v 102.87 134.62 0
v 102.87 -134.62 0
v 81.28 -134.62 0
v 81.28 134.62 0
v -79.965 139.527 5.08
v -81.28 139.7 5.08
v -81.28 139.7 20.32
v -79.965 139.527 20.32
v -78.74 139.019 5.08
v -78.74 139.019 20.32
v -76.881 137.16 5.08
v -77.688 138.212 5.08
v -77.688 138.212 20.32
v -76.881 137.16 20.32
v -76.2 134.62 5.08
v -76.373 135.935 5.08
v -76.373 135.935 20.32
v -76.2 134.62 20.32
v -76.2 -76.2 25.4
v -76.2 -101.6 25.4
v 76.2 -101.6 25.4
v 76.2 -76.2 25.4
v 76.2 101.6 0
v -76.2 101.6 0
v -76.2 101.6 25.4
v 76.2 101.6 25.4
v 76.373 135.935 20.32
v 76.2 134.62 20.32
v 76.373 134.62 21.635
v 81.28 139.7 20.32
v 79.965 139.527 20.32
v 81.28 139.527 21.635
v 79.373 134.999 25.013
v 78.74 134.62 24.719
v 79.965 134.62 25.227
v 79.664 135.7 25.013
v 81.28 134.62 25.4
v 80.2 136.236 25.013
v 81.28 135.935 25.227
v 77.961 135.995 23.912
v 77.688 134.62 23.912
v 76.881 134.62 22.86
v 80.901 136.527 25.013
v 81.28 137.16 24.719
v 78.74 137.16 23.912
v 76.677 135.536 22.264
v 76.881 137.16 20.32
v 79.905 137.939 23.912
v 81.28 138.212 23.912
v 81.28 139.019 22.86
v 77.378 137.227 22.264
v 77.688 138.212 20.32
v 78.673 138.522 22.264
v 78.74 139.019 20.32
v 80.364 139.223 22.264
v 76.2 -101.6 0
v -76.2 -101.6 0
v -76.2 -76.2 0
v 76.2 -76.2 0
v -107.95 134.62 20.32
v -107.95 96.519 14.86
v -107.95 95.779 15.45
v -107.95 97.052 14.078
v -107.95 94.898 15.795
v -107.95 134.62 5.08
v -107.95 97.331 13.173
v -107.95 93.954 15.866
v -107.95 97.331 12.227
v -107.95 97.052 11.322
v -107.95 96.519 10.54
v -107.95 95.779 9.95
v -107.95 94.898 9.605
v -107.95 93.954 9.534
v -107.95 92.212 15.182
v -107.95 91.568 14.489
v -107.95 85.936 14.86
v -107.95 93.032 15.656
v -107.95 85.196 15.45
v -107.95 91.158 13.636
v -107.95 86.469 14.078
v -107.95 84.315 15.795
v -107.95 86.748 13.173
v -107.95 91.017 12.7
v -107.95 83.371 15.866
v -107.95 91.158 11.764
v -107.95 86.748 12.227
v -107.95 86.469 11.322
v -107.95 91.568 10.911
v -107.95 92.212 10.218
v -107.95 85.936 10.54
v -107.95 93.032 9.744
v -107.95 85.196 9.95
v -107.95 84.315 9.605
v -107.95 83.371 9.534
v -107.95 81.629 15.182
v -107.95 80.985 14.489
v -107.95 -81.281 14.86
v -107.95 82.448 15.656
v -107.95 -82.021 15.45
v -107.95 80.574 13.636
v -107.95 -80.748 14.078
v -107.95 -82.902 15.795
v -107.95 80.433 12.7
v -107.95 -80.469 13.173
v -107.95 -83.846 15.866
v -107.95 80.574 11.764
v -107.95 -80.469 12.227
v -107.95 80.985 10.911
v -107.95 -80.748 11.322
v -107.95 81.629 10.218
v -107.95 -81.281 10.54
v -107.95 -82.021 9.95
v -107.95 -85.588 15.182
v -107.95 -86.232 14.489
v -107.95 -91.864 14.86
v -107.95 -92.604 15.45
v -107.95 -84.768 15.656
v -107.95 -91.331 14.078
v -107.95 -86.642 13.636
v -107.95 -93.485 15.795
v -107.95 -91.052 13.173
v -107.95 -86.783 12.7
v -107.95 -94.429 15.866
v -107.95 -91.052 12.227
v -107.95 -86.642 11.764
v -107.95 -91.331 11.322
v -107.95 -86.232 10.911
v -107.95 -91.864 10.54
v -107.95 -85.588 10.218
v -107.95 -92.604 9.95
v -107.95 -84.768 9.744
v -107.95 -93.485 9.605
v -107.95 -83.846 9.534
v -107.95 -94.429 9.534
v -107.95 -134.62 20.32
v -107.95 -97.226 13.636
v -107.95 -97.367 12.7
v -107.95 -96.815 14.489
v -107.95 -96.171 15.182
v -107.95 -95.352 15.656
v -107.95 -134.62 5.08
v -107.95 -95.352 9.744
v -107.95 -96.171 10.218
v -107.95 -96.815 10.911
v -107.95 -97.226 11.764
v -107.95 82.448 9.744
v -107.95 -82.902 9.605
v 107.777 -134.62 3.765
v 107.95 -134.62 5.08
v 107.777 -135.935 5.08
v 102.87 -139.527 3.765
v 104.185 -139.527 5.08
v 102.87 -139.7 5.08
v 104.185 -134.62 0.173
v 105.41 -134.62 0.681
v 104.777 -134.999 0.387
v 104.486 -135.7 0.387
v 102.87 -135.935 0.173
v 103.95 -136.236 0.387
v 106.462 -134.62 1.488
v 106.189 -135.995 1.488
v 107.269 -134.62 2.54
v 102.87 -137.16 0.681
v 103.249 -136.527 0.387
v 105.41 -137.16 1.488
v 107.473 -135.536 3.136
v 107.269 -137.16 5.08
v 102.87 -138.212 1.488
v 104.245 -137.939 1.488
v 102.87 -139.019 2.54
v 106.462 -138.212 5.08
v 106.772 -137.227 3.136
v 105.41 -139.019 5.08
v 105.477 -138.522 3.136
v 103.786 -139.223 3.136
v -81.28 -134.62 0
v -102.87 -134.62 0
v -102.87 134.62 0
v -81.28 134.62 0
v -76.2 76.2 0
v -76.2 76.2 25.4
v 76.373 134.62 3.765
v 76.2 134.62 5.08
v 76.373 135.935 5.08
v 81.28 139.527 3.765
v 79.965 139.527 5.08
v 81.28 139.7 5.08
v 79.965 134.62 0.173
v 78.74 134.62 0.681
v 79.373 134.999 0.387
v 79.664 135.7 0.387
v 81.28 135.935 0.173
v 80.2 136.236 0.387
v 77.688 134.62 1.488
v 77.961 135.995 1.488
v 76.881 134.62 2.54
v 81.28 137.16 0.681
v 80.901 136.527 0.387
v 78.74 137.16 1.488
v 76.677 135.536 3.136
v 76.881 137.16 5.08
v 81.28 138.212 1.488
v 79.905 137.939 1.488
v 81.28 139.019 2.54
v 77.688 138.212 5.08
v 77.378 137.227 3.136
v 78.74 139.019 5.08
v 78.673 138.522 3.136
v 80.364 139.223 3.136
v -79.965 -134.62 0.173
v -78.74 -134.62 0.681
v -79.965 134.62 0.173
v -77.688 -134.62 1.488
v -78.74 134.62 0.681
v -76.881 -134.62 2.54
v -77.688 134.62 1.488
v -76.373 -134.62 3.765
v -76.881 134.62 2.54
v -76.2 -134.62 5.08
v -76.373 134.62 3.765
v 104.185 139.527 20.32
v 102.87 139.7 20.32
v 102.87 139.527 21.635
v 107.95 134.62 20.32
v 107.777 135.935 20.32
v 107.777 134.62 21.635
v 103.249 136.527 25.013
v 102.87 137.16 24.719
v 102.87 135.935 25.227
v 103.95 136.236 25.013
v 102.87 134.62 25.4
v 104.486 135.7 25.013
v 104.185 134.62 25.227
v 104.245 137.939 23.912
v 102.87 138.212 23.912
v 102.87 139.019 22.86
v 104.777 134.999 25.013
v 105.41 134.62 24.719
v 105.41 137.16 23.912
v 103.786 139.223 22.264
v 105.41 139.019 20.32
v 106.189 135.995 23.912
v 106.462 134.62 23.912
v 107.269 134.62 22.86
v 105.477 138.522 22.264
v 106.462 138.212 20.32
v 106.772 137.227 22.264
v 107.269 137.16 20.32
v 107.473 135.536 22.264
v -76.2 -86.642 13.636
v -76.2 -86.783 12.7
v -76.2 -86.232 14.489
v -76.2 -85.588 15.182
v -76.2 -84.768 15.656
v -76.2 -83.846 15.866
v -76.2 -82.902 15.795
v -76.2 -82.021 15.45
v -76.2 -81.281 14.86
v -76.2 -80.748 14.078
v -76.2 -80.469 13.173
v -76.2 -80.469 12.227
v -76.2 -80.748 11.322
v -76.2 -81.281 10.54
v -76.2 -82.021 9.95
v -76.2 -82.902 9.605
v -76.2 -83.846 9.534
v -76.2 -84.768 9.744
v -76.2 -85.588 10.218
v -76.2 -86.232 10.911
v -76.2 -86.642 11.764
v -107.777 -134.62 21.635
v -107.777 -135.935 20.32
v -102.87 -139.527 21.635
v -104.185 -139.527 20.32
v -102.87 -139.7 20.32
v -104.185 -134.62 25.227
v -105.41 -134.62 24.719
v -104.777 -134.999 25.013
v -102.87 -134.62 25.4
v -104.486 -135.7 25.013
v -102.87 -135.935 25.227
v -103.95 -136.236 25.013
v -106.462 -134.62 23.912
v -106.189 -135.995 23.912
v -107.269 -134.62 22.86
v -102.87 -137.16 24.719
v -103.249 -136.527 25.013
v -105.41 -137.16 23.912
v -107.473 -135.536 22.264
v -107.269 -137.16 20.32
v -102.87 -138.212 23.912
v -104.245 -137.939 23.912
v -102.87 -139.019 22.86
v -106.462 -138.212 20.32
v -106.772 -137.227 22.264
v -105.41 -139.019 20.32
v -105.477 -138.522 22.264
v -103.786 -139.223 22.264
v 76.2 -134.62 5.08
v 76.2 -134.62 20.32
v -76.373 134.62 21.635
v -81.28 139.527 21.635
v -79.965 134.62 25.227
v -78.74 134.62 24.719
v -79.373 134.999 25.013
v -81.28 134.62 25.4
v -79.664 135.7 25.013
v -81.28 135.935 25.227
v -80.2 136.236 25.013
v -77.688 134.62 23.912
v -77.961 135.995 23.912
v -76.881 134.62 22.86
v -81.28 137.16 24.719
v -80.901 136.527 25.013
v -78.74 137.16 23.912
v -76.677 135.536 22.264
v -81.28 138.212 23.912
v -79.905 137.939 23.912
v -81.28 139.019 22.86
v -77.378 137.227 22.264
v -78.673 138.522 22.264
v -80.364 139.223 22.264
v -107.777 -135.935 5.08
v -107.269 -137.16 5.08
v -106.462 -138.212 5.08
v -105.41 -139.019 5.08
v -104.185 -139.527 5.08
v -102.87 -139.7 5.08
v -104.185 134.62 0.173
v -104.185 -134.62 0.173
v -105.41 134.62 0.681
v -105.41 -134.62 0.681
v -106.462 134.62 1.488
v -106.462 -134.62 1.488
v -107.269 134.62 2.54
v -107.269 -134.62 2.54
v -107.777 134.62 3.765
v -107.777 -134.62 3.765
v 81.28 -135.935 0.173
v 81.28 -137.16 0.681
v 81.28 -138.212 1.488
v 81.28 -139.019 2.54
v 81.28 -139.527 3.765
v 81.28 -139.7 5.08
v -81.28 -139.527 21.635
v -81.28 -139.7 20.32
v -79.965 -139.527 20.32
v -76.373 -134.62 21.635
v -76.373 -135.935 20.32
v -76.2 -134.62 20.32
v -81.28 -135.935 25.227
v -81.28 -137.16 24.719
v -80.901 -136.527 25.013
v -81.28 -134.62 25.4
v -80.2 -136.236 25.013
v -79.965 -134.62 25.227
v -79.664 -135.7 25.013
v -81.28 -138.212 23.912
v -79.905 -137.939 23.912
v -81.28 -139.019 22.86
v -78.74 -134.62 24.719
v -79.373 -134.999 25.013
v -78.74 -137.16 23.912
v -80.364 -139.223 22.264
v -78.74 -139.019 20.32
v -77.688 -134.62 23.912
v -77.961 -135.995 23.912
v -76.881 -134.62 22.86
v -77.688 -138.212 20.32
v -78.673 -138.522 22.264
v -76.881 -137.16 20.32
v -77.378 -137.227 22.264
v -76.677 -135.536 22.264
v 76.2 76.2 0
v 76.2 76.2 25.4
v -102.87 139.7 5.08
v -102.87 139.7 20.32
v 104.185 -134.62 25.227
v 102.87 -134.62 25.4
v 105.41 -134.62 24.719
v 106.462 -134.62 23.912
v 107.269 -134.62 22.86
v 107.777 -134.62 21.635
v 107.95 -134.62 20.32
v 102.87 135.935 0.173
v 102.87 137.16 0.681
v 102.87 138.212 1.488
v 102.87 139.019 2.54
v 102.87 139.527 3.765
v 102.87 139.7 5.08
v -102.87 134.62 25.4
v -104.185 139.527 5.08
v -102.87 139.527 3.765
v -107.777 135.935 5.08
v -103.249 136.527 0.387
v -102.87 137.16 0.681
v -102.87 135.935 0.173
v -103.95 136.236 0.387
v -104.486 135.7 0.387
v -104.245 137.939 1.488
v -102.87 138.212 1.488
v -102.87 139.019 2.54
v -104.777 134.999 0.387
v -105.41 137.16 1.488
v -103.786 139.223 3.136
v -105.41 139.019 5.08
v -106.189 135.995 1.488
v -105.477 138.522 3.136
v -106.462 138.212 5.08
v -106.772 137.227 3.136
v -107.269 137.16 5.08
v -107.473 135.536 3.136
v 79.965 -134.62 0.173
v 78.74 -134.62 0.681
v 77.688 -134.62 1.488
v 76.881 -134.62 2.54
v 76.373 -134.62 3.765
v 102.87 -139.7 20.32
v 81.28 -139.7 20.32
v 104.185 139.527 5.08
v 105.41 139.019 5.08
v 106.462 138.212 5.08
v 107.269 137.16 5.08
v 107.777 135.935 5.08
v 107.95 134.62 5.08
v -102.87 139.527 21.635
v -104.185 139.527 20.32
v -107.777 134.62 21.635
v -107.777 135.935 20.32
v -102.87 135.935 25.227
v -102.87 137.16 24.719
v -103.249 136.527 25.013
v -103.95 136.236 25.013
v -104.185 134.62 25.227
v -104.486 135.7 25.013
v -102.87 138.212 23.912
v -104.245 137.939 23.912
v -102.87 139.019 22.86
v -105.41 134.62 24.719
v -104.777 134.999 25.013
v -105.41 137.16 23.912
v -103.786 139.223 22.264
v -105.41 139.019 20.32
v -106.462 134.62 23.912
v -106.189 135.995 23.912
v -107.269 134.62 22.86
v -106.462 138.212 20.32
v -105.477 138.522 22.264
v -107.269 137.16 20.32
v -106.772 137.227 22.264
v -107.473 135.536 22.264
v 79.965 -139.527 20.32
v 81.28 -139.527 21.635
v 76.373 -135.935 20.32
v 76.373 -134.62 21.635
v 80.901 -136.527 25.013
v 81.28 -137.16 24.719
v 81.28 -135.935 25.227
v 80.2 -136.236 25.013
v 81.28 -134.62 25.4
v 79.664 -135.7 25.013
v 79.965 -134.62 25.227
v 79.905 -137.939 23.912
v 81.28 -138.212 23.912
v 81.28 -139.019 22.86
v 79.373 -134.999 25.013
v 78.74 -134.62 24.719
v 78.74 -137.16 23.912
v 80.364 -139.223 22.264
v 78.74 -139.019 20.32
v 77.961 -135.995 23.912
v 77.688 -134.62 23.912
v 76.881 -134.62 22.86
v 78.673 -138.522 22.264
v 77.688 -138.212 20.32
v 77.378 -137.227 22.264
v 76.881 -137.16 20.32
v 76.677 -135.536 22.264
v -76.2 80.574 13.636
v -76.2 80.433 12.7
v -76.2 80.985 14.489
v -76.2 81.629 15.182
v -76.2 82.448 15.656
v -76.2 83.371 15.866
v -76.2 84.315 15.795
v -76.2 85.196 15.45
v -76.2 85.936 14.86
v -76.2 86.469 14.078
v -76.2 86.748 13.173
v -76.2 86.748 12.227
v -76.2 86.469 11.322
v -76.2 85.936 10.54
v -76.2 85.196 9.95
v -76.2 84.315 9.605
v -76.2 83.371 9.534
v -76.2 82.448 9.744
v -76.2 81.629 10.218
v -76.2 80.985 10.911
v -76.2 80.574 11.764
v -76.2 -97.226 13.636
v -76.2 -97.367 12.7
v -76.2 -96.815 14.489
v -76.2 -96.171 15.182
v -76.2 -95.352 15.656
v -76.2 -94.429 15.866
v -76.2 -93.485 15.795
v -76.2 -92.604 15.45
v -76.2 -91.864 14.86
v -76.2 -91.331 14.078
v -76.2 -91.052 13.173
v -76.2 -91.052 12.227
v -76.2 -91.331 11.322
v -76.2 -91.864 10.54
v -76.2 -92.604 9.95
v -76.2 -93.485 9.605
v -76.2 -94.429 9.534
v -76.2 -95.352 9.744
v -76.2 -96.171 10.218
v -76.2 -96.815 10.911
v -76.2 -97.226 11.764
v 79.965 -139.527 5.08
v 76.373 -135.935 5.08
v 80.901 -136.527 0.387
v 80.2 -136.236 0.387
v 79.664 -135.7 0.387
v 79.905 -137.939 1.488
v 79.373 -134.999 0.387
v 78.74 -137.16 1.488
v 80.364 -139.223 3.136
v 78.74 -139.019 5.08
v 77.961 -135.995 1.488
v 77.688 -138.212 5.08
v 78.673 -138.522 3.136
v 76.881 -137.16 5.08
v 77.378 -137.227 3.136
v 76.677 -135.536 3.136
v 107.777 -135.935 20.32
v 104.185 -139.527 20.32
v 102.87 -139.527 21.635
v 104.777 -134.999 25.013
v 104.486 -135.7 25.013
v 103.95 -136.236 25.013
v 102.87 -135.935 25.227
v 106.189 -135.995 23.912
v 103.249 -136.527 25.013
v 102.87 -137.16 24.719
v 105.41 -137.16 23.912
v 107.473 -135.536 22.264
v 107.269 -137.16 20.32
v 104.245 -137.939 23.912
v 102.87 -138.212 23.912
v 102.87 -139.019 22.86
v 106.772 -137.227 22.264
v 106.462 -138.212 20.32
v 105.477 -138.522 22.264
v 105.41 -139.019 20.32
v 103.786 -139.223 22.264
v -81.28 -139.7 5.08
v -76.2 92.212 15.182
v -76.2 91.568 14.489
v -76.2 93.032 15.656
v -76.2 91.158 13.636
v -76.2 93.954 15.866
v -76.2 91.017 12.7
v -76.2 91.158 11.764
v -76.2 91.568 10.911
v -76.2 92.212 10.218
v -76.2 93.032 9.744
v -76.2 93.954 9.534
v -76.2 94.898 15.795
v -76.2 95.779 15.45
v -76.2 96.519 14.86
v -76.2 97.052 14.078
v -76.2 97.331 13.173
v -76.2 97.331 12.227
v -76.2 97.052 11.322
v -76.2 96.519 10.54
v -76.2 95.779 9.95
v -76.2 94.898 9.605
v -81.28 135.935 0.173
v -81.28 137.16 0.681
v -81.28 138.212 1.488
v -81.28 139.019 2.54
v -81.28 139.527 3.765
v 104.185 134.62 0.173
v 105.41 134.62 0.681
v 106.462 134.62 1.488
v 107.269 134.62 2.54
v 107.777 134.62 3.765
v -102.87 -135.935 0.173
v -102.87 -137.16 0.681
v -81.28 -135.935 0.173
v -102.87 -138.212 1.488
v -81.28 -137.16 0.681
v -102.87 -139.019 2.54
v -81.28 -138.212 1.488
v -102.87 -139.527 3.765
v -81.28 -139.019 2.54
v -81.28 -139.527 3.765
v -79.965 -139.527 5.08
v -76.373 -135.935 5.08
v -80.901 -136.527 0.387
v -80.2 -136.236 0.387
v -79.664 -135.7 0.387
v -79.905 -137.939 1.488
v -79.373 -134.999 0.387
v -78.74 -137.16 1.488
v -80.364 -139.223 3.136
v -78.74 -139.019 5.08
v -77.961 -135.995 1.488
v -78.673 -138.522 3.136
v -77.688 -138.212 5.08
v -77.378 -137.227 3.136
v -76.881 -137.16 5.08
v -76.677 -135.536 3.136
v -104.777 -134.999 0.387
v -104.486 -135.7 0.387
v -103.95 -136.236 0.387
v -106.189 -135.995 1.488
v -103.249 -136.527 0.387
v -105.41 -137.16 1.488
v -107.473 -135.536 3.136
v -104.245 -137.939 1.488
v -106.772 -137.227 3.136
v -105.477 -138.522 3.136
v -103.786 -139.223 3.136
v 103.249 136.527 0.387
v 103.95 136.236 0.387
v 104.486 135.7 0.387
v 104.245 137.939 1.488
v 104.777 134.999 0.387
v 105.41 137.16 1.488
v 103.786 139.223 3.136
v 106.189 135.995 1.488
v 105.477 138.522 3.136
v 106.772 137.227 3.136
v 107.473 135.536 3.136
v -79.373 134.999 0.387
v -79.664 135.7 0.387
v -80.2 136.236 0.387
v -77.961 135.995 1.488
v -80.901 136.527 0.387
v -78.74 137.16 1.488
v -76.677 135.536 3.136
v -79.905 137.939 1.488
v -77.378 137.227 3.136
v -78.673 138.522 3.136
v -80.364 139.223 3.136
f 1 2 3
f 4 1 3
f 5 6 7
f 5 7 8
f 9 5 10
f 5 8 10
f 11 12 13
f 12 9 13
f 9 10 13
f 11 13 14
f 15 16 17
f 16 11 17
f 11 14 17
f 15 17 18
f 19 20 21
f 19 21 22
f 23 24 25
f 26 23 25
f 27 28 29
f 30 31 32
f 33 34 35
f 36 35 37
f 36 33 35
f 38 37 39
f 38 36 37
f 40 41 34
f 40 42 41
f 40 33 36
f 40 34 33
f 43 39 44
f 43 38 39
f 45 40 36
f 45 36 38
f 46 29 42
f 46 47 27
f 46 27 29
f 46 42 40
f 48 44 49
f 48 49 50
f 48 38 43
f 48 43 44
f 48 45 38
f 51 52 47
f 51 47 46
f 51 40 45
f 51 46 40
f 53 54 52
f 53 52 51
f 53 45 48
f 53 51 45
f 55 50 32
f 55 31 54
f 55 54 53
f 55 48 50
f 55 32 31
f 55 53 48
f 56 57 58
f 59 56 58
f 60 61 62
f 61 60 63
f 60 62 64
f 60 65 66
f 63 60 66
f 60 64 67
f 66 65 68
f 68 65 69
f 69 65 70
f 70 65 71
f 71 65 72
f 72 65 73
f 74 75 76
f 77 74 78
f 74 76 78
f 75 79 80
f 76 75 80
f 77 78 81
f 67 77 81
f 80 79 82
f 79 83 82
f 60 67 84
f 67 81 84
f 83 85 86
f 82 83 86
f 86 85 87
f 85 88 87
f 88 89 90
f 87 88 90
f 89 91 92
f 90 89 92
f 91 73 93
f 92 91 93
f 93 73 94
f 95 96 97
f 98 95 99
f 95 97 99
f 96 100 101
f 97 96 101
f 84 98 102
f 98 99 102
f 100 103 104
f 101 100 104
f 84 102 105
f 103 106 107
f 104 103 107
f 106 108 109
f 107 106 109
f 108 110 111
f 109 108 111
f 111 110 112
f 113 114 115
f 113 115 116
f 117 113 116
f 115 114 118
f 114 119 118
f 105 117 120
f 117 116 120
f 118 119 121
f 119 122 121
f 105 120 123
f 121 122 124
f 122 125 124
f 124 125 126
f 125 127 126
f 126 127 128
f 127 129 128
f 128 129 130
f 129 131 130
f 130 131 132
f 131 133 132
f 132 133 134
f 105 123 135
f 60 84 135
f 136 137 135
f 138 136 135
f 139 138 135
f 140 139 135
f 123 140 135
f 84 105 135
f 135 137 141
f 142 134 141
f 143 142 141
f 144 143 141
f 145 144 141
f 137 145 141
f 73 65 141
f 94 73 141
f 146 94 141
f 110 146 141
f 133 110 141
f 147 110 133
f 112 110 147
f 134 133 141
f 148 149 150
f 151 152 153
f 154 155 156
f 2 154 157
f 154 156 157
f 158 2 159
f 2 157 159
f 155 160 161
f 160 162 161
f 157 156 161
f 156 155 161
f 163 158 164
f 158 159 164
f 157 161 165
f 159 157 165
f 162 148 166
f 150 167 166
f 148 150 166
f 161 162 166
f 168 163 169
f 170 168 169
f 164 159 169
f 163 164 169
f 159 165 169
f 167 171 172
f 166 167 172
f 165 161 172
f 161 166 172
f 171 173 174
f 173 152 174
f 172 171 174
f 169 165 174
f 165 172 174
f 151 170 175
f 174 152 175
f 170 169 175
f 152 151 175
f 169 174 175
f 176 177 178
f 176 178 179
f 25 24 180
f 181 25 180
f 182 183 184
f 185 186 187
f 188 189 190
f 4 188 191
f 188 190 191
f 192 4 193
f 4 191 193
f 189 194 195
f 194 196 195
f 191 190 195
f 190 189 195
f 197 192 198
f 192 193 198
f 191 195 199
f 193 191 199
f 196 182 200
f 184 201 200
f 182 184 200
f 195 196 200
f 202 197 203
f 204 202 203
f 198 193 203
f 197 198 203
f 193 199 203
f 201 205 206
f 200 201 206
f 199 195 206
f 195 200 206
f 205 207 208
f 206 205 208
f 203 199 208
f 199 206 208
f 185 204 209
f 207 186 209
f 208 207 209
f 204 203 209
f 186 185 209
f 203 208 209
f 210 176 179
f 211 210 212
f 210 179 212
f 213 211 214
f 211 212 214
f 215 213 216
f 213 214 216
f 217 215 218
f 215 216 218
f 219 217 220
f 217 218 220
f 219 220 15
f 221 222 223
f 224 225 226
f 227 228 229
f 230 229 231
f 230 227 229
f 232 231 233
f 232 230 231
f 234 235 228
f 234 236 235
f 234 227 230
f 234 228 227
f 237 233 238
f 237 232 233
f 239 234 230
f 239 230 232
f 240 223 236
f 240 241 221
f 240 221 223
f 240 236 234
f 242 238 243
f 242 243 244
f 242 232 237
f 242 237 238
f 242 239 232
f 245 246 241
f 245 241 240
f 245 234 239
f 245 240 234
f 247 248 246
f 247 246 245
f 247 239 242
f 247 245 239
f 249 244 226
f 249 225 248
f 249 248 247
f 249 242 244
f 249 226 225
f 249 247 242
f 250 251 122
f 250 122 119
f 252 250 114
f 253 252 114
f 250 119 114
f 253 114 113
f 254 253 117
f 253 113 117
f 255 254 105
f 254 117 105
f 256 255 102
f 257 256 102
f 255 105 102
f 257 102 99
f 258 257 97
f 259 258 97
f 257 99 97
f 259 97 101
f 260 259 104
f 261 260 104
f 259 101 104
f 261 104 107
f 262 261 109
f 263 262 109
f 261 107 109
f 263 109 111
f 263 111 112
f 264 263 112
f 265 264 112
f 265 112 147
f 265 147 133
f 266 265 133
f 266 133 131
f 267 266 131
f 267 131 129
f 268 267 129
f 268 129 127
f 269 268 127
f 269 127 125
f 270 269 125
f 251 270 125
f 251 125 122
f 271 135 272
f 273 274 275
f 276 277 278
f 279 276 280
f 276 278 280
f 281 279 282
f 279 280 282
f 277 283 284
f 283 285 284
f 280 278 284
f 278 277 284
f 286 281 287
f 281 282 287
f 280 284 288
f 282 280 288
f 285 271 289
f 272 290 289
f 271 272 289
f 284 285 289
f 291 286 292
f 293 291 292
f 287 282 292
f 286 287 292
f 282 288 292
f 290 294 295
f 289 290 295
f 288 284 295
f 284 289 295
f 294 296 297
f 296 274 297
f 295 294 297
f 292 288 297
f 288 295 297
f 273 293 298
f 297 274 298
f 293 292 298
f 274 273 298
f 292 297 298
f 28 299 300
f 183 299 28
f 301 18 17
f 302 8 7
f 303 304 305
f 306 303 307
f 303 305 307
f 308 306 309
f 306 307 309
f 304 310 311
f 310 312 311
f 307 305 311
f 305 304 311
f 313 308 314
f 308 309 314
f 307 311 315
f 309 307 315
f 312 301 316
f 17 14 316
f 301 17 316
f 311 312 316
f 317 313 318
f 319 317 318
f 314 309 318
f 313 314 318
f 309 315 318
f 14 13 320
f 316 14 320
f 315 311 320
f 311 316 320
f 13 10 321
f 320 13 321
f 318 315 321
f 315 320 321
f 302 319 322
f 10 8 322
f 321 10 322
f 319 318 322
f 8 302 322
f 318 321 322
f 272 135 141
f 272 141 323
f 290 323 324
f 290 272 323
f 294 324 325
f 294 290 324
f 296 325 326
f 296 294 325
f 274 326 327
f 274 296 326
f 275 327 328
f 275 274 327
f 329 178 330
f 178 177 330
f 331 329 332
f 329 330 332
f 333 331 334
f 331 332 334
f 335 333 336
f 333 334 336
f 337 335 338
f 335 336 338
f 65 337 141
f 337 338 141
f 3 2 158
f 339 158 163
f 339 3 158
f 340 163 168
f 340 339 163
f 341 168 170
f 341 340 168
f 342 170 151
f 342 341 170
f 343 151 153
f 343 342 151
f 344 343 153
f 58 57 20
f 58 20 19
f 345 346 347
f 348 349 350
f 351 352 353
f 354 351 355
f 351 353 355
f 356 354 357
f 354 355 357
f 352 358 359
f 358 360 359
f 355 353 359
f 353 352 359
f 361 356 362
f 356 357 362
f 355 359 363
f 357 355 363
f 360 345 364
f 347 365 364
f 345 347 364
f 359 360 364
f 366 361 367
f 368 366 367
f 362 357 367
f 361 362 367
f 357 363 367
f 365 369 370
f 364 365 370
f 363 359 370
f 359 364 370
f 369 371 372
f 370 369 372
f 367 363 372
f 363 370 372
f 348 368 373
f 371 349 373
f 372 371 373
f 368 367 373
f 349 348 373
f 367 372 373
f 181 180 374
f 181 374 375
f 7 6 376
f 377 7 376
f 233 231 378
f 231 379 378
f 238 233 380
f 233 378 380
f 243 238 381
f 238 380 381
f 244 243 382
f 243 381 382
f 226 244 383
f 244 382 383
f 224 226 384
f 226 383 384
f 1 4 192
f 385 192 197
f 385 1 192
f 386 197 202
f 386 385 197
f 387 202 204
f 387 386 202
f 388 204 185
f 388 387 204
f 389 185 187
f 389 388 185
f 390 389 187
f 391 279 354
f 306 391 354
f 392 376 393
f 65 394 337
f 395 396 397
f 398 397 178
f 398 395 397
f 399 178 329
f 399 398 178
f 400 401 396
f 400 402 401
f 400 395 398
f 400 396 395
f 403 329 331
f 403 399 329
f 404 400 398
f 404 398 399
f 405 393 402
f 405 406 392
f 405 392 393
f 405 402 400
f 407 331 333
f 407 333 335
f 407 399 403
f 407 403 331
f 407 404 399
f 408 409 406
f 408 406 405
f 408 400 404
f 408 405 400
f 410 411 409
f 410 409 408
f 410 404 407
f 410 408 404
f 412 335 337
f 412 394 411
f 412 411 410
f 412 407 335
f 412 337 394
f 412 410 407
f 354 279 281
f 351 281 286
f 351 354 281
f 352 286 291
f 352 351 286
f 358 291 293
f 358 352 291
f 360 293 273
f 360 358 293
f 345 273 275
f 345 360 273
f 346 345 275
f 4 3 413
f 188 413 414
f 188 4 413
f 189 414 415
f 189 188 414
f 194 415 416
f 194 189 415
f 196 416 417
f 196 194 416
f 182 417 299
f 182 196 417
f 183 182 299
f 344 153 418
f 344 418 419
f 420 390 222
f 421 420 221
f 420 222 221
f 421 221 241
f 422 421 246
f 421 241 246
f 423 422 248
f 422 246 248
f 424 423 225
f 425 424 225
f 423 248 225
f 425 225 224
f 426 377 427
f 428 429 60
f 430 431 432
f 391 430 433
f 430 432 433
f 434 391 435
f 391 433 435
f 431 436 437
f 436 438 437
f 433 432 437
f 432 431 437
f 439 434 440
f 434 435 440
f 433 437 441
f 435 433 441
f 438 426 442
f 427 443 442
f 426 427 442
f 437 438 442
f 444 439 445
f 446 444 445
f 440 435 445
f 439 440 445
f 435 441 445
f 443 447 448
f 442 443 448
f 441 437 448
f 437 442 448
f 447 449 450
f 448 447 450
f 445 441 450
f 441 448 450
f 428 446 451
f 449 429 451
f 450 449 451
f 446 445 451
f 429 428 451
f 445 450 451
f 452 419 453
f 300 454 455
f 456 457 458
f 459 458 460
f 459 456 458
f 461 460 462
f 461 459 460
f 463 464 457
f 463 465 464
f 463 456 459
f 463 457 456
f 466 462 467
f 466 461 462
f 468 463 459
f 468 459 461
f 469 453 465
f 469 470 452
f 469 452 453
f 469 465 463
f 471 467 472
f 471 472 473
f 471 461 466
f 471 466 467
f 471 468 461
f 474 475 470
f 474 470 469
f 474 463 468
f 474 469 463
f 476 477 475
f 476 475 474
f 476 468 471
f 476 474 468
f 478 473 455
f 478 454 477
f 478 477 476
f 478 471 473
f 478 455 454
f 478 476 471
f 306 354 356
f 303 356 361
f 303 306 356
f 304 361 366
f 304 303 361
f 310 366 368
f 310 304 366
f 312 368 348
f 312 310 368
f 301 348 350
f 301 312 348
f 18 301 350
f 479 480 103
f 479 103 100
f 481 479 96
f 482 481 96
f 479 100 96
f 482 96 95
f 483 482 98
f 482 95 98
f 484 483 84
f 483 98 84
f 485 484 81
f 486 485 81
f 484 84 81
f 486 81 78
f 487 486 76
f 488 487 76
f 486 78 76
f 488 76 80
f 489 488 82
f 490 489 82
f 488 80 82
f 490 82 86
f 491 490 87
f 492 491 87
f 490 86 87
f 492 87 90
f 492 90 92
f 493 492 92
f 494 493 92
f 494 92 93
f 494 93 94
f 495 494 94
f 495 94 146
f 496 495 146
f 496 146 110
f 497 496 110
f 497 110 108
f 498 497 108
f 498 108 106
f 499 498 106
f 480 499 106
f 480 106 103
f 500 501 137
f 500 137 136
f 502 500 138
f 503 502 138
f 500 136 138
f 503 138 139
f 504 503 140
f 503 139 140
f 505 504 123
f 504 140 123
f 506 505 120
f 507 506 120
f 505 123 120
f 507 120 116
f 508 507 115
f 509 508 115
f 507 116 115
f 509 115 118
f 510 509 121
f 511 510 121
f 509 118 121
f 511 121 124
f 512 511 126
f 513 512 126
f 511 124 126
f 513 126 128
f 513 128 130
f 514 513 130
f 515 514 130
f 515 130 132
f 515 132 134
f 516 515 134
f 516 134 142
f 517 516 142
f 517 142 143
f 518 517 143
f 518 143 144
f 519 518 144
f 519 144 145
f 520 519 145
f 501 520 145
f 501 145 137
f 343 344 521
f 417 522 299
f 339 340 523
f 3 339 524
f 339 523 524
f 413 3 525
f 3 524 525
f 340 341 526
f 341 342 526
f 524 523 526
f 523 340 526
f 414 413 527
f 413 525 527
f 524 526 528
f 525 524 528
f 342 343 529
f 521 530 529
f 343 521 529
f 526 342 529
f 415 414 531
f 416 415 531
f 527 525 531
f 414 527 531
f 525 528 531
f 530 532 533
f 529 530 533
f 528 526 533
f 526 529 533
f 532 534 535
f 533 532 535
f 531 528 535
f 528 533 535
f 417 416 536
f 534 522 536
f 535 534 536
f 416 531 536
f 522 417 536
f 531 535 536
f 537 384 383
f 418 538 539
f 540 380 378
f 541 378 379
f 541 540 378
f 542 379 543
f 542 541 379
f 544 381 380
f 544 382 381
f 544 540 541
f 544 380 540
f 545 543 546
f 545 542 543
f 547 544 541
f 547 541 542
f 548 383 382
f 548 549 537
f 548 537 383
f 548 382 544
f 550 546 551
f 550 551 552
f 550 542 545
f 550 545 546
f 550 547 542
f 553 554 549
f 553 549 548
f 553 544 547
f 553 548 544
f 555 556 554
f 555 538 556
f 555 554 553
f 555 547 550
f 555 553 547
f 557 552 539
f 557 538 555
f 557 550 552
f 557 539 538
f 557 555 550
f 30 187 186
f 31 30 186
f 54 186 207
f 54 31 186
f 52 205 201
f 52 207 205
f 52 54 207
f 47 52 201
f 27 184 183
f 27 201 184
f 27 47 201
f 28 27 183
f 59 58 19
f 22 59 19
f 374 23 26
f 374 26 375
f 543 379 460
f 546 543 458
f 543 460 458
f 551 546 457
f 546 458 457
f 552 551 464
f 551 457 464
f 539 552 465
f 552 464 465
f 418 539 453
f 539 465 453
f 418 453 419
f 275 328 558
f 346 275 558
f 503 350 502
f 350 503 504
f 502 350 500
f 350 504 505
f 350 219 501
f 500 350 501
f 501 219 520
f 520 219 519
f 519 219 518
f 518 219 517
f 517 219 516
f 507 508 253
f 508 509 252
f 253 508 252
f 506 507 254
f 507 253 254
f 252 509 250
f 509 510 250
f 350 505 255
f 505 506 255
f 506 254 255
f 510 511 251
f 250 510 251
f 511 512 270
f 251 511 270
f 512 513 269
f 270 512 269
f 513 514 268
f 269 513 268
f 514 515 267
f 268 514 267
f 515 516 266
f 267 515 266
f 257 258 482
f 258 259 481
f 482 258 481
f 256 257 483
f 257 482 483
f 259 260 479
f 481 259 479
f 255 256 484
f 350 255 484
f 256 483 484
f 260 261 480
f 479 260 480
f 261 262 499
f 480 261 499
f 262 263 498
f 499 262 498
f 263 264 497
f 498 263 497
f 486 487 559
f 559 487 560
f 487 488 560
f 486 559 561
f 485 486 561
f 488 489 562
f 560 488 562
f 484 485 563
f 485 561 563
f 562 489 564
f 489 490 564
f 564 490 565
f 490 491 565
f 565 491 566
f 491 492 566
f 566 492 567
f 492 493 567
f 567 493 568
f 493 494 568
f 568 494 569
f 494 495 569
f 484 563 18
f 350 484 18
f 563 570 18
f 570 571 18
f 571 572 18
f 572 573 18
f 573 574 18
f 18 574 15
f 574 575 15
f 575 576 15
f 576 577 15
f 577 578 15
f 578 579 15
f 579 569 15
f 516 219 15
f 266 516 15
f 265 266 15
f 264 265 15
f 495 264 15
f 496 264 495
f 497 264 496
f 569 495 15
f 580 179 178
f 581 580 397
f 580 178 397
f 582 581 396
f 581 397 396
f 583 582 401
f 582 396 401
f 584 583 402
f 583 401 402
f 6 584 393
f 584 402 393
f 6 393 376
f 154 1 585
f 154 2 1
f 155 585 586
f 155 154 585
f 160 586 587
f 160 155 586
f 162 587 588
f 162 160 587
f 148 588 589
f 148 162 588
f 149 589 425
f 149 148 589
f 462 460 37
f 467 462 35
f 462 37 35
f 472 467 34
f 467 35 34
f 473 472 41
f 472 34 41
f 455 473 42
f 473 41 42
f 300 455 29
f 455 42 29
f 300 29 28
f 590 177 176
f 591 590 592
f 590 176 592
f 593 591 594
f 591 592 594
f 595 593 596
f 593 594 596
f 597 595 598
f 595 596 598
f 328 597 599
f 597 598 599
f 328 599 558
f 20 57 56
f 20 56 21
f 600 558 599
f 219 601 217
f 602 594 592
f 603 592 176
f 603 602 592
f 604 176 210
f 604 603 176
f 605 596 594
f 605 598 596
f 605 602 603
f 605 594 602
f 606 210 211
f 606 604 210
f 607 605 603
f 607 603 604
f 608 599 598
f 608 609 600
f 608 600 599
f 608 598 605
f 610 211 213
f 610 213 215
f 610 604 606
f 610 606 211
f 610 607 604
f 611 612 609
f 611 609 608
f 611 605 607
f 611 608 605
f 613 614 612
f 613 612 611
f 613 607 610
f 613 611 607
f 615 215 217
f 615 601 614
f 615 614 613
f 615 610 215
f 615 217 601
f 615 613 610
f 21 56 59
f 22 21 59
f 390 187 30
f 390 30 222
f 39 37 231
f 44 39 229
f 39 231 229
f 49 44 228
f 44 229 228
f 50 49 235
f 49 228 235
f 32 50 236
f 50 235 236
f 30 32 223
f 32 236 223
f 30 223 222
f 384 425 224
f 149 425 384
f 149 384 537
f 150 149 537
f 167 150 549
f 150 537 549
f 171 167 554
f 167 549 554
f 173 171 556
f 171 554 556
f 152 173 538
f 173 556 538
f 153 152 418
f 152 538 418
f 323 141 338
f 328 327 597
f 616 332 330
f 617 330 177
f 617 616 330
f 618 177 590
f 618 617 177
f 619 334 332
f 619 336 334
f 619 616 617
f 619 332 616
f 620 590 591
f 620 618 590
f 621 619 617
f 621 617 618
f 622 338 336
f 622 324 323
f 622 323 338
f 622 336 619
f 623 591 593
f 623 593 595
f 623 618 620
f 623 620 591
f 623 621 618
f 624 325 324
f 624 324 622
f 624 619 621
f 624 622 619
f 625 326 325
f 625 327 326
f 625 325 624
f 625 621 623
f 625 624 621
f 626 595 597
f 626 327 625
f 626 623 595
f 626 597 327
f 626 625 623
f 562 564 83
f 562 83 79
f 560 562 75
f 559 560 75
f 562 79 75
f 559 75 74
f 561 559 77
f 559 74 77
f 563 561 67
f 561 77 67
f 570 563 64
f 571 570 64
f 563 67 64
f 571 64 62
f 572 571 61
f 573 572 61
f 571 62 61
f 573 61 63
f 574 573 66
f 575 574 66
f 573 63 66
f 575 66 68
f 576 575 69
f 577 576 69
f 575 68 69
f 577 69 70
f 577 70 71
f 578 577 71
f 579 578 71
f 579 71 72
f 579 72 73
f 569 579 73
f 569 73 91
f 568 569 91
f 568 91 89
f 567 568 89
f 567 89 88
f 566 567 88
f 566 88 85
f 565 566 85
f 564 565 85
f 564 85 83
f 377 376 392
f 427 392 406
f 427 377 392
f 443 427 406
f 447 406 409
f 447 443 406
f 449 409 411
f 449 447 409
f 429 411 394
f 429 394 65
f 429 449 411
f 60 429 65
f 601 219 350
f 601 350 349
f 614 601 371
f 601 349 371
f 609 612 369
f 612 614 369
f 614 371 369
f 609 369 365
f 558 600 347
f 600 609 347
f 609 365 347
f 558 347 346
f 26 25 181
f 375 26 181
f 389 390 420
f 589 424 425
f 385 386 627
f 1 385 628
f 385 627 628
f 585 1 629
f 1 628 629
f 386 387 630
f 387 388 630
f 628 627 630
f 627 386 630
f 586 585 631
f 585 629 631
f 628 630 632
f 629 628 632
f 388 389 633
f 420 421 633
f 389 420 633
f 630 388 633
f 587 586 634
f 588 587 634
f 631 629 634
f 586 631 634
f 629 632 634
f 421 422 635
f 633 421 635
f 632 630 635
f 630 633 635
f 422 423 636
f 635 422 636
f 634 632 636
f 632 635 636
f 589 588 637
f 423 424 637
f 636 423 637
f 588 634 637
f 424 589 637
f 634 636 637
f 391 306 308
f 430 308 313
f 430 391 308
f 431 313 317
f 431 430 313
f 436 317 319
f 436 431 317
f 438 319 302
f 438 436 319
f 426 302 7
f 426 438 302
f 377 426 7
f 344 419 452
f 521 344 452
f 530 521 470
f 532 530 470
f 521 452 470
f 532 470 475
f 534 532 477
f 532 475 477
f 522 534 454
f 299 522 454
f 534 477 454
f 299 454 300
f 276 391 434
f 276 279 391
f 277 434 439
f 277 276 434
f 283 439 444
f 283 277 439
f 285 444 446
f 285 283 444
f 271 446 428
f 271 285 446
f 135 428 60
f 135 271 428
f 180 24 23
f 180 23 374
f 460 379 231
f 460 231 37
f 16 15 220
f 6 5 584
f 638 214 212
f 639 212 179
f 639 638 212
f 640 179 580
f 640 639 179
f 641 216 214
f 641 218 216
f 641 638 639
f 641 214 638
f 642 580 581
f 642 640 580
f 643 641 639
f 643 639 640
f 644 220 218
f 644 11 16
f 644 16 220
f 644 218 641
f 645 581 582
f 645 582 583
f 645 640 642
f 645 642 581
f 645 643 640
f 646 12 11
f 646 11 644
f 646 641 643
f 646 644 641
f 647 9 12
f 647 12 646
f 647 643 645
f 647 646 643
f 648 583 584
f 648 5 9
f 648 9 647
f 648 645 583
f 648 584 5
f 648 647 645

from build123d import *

# Parameters (mm, degrees)
F1_DEPTH = 25.4
F3_W     = 25.4
F3_H     = 25.4
F4_DEPTH = 152.4
F6_R     = 3.175
F7_DEPTH = 76.2
F8_R     = 5.08
F8_2_R   = 5.08
F9_R     = 5.08
F9_2_R   = 5.08


with BuildPart() as f1:
    # F0 (on Top) → F1 (new body)
    with BuildSketch(Plane.XY):
        Polygon((-76.2, 139.7), (-107.95, 139.7), (-107.95, -139.7), (-76.2, -139.7), (-76.2, 0), align=None)
    extrude(amount=F1_DEPTH)


with BuildPart() as f2_1:
    # F2: instance of F1
    add(f1.part.mirror(Plane.YZ))

    # F8#2
    f8_2_edges = [f2_1.edges().sort_by_distance(p)[0] for p in [
        (76.2, -139.7, 12.7),
        (107.95, -139.7, 12.7),
        (107.95, 139.7, 12.7),
        (76.2, 139.7, 12.7),
    ]]
    fillet(f8_2_edges, radius=F8_2_R)

    # F9#2
    f9_2_edges = [f2_1.edges().sort_by_distance(p)[0] for p in [
        (107.95, 0, 25.4),
        (107.95, 0, 0),
        (92.075, 139.7, 0),
        (92.075, 139.7, 25.4),
        (77.687898, 138.212102, 0),
        (106.462102, 138.212102, 0),
        (77.687898, -138.212102, 0),
        (106.462102, -138.212102, 0),
        (92.075, -139.7, 0),
        (77.687898, 138.212102, 25.4),
        (106.462102, 138.212102, 25.4),
        (77.687898, -138.212102, 25.4),
        (106.462102, -138.212102, 25.4),
        (92.075, -139.7, 25.4),
    ]]
    fillet(f9_2_edges, radius=F9_2_R)


with BuildPart() as f4:
    # F3 (on face) → F4 (new body, through all)
    with BuildSketch(Plane.YZ.offset(-76.2)):
        with Locations((-88.9, 12.7)):
            Rectangle(F3_W, F3_H)
    extrude(amount=F4_DEPTH)


with BuildPart() as f5_1:
    # F5: instance of F4
    add(f4.part.mirror(Plane.XZ))


with BuildPart() as f1_1:
    add(f1.part)

    # F6 (on face) → F7 (cut)
    with BuildSketch(Plane(origin=(-107.95, 0, 0), x_dir=(0, -1, 0), z_dir=(-1, 0, 0))):
        with Locations((94.1916666667, 12.7)):
            Circle(F6_R)
        with Locations((83.6083333333, 12.7)):
            Circle(F6_R)
        with Locations((-83.6083333333, 12.7)):
            Circle(F6_R)
        with Locations((-94.1916666667, 12.7)):
            Circle(F6_R)
    extrude(amount=-F7_DEPTH, mode=Mode.SUBTRACT)

    # F8
    f8_edges = [f1_1.edges().sort_by_distance(p)[0] for p in [
        (-107.95, -139.7, 12.7),
        (-76.2, -139.7, 12.7),
        (-76.2, 139.7, 12.7),
        (-107.95, 139.7, 12.7),
    ]]
    fillet(f8_edges, radius=F8_R)

    # F9
    f9_edges = [f1_1.edges().sort_by_distance(p)[0] for p in [
        (-107.95, 0, 25.4),
        (-107.95, 0, 0),
        (-92.075, 139.7, 0),
        (-92.075, 139.7, 25.4),
        (-77.687898, 138.212102, 0),
        (-106.462102, 138.212102, 0),
        (-77.687898, -138.212102, 0),
        (-106.462102, -138.212102, 0),
        (-92.075, -139.7, 0),
        (-77.687898, 138.212102, 25.4),
        (-106.462102, 138.212102, 25.4),
        (-77.687898, -138.212102, 25.4),
        (-106.462102, -138.212102, 25.4),
        (-92.075, -139.7, 25.4),
    ]]
    fillet(f9_edges, radius=F9_R)


solid = Compound([f2_1.part, f4.part, f5_1.part, f1_1.part])
